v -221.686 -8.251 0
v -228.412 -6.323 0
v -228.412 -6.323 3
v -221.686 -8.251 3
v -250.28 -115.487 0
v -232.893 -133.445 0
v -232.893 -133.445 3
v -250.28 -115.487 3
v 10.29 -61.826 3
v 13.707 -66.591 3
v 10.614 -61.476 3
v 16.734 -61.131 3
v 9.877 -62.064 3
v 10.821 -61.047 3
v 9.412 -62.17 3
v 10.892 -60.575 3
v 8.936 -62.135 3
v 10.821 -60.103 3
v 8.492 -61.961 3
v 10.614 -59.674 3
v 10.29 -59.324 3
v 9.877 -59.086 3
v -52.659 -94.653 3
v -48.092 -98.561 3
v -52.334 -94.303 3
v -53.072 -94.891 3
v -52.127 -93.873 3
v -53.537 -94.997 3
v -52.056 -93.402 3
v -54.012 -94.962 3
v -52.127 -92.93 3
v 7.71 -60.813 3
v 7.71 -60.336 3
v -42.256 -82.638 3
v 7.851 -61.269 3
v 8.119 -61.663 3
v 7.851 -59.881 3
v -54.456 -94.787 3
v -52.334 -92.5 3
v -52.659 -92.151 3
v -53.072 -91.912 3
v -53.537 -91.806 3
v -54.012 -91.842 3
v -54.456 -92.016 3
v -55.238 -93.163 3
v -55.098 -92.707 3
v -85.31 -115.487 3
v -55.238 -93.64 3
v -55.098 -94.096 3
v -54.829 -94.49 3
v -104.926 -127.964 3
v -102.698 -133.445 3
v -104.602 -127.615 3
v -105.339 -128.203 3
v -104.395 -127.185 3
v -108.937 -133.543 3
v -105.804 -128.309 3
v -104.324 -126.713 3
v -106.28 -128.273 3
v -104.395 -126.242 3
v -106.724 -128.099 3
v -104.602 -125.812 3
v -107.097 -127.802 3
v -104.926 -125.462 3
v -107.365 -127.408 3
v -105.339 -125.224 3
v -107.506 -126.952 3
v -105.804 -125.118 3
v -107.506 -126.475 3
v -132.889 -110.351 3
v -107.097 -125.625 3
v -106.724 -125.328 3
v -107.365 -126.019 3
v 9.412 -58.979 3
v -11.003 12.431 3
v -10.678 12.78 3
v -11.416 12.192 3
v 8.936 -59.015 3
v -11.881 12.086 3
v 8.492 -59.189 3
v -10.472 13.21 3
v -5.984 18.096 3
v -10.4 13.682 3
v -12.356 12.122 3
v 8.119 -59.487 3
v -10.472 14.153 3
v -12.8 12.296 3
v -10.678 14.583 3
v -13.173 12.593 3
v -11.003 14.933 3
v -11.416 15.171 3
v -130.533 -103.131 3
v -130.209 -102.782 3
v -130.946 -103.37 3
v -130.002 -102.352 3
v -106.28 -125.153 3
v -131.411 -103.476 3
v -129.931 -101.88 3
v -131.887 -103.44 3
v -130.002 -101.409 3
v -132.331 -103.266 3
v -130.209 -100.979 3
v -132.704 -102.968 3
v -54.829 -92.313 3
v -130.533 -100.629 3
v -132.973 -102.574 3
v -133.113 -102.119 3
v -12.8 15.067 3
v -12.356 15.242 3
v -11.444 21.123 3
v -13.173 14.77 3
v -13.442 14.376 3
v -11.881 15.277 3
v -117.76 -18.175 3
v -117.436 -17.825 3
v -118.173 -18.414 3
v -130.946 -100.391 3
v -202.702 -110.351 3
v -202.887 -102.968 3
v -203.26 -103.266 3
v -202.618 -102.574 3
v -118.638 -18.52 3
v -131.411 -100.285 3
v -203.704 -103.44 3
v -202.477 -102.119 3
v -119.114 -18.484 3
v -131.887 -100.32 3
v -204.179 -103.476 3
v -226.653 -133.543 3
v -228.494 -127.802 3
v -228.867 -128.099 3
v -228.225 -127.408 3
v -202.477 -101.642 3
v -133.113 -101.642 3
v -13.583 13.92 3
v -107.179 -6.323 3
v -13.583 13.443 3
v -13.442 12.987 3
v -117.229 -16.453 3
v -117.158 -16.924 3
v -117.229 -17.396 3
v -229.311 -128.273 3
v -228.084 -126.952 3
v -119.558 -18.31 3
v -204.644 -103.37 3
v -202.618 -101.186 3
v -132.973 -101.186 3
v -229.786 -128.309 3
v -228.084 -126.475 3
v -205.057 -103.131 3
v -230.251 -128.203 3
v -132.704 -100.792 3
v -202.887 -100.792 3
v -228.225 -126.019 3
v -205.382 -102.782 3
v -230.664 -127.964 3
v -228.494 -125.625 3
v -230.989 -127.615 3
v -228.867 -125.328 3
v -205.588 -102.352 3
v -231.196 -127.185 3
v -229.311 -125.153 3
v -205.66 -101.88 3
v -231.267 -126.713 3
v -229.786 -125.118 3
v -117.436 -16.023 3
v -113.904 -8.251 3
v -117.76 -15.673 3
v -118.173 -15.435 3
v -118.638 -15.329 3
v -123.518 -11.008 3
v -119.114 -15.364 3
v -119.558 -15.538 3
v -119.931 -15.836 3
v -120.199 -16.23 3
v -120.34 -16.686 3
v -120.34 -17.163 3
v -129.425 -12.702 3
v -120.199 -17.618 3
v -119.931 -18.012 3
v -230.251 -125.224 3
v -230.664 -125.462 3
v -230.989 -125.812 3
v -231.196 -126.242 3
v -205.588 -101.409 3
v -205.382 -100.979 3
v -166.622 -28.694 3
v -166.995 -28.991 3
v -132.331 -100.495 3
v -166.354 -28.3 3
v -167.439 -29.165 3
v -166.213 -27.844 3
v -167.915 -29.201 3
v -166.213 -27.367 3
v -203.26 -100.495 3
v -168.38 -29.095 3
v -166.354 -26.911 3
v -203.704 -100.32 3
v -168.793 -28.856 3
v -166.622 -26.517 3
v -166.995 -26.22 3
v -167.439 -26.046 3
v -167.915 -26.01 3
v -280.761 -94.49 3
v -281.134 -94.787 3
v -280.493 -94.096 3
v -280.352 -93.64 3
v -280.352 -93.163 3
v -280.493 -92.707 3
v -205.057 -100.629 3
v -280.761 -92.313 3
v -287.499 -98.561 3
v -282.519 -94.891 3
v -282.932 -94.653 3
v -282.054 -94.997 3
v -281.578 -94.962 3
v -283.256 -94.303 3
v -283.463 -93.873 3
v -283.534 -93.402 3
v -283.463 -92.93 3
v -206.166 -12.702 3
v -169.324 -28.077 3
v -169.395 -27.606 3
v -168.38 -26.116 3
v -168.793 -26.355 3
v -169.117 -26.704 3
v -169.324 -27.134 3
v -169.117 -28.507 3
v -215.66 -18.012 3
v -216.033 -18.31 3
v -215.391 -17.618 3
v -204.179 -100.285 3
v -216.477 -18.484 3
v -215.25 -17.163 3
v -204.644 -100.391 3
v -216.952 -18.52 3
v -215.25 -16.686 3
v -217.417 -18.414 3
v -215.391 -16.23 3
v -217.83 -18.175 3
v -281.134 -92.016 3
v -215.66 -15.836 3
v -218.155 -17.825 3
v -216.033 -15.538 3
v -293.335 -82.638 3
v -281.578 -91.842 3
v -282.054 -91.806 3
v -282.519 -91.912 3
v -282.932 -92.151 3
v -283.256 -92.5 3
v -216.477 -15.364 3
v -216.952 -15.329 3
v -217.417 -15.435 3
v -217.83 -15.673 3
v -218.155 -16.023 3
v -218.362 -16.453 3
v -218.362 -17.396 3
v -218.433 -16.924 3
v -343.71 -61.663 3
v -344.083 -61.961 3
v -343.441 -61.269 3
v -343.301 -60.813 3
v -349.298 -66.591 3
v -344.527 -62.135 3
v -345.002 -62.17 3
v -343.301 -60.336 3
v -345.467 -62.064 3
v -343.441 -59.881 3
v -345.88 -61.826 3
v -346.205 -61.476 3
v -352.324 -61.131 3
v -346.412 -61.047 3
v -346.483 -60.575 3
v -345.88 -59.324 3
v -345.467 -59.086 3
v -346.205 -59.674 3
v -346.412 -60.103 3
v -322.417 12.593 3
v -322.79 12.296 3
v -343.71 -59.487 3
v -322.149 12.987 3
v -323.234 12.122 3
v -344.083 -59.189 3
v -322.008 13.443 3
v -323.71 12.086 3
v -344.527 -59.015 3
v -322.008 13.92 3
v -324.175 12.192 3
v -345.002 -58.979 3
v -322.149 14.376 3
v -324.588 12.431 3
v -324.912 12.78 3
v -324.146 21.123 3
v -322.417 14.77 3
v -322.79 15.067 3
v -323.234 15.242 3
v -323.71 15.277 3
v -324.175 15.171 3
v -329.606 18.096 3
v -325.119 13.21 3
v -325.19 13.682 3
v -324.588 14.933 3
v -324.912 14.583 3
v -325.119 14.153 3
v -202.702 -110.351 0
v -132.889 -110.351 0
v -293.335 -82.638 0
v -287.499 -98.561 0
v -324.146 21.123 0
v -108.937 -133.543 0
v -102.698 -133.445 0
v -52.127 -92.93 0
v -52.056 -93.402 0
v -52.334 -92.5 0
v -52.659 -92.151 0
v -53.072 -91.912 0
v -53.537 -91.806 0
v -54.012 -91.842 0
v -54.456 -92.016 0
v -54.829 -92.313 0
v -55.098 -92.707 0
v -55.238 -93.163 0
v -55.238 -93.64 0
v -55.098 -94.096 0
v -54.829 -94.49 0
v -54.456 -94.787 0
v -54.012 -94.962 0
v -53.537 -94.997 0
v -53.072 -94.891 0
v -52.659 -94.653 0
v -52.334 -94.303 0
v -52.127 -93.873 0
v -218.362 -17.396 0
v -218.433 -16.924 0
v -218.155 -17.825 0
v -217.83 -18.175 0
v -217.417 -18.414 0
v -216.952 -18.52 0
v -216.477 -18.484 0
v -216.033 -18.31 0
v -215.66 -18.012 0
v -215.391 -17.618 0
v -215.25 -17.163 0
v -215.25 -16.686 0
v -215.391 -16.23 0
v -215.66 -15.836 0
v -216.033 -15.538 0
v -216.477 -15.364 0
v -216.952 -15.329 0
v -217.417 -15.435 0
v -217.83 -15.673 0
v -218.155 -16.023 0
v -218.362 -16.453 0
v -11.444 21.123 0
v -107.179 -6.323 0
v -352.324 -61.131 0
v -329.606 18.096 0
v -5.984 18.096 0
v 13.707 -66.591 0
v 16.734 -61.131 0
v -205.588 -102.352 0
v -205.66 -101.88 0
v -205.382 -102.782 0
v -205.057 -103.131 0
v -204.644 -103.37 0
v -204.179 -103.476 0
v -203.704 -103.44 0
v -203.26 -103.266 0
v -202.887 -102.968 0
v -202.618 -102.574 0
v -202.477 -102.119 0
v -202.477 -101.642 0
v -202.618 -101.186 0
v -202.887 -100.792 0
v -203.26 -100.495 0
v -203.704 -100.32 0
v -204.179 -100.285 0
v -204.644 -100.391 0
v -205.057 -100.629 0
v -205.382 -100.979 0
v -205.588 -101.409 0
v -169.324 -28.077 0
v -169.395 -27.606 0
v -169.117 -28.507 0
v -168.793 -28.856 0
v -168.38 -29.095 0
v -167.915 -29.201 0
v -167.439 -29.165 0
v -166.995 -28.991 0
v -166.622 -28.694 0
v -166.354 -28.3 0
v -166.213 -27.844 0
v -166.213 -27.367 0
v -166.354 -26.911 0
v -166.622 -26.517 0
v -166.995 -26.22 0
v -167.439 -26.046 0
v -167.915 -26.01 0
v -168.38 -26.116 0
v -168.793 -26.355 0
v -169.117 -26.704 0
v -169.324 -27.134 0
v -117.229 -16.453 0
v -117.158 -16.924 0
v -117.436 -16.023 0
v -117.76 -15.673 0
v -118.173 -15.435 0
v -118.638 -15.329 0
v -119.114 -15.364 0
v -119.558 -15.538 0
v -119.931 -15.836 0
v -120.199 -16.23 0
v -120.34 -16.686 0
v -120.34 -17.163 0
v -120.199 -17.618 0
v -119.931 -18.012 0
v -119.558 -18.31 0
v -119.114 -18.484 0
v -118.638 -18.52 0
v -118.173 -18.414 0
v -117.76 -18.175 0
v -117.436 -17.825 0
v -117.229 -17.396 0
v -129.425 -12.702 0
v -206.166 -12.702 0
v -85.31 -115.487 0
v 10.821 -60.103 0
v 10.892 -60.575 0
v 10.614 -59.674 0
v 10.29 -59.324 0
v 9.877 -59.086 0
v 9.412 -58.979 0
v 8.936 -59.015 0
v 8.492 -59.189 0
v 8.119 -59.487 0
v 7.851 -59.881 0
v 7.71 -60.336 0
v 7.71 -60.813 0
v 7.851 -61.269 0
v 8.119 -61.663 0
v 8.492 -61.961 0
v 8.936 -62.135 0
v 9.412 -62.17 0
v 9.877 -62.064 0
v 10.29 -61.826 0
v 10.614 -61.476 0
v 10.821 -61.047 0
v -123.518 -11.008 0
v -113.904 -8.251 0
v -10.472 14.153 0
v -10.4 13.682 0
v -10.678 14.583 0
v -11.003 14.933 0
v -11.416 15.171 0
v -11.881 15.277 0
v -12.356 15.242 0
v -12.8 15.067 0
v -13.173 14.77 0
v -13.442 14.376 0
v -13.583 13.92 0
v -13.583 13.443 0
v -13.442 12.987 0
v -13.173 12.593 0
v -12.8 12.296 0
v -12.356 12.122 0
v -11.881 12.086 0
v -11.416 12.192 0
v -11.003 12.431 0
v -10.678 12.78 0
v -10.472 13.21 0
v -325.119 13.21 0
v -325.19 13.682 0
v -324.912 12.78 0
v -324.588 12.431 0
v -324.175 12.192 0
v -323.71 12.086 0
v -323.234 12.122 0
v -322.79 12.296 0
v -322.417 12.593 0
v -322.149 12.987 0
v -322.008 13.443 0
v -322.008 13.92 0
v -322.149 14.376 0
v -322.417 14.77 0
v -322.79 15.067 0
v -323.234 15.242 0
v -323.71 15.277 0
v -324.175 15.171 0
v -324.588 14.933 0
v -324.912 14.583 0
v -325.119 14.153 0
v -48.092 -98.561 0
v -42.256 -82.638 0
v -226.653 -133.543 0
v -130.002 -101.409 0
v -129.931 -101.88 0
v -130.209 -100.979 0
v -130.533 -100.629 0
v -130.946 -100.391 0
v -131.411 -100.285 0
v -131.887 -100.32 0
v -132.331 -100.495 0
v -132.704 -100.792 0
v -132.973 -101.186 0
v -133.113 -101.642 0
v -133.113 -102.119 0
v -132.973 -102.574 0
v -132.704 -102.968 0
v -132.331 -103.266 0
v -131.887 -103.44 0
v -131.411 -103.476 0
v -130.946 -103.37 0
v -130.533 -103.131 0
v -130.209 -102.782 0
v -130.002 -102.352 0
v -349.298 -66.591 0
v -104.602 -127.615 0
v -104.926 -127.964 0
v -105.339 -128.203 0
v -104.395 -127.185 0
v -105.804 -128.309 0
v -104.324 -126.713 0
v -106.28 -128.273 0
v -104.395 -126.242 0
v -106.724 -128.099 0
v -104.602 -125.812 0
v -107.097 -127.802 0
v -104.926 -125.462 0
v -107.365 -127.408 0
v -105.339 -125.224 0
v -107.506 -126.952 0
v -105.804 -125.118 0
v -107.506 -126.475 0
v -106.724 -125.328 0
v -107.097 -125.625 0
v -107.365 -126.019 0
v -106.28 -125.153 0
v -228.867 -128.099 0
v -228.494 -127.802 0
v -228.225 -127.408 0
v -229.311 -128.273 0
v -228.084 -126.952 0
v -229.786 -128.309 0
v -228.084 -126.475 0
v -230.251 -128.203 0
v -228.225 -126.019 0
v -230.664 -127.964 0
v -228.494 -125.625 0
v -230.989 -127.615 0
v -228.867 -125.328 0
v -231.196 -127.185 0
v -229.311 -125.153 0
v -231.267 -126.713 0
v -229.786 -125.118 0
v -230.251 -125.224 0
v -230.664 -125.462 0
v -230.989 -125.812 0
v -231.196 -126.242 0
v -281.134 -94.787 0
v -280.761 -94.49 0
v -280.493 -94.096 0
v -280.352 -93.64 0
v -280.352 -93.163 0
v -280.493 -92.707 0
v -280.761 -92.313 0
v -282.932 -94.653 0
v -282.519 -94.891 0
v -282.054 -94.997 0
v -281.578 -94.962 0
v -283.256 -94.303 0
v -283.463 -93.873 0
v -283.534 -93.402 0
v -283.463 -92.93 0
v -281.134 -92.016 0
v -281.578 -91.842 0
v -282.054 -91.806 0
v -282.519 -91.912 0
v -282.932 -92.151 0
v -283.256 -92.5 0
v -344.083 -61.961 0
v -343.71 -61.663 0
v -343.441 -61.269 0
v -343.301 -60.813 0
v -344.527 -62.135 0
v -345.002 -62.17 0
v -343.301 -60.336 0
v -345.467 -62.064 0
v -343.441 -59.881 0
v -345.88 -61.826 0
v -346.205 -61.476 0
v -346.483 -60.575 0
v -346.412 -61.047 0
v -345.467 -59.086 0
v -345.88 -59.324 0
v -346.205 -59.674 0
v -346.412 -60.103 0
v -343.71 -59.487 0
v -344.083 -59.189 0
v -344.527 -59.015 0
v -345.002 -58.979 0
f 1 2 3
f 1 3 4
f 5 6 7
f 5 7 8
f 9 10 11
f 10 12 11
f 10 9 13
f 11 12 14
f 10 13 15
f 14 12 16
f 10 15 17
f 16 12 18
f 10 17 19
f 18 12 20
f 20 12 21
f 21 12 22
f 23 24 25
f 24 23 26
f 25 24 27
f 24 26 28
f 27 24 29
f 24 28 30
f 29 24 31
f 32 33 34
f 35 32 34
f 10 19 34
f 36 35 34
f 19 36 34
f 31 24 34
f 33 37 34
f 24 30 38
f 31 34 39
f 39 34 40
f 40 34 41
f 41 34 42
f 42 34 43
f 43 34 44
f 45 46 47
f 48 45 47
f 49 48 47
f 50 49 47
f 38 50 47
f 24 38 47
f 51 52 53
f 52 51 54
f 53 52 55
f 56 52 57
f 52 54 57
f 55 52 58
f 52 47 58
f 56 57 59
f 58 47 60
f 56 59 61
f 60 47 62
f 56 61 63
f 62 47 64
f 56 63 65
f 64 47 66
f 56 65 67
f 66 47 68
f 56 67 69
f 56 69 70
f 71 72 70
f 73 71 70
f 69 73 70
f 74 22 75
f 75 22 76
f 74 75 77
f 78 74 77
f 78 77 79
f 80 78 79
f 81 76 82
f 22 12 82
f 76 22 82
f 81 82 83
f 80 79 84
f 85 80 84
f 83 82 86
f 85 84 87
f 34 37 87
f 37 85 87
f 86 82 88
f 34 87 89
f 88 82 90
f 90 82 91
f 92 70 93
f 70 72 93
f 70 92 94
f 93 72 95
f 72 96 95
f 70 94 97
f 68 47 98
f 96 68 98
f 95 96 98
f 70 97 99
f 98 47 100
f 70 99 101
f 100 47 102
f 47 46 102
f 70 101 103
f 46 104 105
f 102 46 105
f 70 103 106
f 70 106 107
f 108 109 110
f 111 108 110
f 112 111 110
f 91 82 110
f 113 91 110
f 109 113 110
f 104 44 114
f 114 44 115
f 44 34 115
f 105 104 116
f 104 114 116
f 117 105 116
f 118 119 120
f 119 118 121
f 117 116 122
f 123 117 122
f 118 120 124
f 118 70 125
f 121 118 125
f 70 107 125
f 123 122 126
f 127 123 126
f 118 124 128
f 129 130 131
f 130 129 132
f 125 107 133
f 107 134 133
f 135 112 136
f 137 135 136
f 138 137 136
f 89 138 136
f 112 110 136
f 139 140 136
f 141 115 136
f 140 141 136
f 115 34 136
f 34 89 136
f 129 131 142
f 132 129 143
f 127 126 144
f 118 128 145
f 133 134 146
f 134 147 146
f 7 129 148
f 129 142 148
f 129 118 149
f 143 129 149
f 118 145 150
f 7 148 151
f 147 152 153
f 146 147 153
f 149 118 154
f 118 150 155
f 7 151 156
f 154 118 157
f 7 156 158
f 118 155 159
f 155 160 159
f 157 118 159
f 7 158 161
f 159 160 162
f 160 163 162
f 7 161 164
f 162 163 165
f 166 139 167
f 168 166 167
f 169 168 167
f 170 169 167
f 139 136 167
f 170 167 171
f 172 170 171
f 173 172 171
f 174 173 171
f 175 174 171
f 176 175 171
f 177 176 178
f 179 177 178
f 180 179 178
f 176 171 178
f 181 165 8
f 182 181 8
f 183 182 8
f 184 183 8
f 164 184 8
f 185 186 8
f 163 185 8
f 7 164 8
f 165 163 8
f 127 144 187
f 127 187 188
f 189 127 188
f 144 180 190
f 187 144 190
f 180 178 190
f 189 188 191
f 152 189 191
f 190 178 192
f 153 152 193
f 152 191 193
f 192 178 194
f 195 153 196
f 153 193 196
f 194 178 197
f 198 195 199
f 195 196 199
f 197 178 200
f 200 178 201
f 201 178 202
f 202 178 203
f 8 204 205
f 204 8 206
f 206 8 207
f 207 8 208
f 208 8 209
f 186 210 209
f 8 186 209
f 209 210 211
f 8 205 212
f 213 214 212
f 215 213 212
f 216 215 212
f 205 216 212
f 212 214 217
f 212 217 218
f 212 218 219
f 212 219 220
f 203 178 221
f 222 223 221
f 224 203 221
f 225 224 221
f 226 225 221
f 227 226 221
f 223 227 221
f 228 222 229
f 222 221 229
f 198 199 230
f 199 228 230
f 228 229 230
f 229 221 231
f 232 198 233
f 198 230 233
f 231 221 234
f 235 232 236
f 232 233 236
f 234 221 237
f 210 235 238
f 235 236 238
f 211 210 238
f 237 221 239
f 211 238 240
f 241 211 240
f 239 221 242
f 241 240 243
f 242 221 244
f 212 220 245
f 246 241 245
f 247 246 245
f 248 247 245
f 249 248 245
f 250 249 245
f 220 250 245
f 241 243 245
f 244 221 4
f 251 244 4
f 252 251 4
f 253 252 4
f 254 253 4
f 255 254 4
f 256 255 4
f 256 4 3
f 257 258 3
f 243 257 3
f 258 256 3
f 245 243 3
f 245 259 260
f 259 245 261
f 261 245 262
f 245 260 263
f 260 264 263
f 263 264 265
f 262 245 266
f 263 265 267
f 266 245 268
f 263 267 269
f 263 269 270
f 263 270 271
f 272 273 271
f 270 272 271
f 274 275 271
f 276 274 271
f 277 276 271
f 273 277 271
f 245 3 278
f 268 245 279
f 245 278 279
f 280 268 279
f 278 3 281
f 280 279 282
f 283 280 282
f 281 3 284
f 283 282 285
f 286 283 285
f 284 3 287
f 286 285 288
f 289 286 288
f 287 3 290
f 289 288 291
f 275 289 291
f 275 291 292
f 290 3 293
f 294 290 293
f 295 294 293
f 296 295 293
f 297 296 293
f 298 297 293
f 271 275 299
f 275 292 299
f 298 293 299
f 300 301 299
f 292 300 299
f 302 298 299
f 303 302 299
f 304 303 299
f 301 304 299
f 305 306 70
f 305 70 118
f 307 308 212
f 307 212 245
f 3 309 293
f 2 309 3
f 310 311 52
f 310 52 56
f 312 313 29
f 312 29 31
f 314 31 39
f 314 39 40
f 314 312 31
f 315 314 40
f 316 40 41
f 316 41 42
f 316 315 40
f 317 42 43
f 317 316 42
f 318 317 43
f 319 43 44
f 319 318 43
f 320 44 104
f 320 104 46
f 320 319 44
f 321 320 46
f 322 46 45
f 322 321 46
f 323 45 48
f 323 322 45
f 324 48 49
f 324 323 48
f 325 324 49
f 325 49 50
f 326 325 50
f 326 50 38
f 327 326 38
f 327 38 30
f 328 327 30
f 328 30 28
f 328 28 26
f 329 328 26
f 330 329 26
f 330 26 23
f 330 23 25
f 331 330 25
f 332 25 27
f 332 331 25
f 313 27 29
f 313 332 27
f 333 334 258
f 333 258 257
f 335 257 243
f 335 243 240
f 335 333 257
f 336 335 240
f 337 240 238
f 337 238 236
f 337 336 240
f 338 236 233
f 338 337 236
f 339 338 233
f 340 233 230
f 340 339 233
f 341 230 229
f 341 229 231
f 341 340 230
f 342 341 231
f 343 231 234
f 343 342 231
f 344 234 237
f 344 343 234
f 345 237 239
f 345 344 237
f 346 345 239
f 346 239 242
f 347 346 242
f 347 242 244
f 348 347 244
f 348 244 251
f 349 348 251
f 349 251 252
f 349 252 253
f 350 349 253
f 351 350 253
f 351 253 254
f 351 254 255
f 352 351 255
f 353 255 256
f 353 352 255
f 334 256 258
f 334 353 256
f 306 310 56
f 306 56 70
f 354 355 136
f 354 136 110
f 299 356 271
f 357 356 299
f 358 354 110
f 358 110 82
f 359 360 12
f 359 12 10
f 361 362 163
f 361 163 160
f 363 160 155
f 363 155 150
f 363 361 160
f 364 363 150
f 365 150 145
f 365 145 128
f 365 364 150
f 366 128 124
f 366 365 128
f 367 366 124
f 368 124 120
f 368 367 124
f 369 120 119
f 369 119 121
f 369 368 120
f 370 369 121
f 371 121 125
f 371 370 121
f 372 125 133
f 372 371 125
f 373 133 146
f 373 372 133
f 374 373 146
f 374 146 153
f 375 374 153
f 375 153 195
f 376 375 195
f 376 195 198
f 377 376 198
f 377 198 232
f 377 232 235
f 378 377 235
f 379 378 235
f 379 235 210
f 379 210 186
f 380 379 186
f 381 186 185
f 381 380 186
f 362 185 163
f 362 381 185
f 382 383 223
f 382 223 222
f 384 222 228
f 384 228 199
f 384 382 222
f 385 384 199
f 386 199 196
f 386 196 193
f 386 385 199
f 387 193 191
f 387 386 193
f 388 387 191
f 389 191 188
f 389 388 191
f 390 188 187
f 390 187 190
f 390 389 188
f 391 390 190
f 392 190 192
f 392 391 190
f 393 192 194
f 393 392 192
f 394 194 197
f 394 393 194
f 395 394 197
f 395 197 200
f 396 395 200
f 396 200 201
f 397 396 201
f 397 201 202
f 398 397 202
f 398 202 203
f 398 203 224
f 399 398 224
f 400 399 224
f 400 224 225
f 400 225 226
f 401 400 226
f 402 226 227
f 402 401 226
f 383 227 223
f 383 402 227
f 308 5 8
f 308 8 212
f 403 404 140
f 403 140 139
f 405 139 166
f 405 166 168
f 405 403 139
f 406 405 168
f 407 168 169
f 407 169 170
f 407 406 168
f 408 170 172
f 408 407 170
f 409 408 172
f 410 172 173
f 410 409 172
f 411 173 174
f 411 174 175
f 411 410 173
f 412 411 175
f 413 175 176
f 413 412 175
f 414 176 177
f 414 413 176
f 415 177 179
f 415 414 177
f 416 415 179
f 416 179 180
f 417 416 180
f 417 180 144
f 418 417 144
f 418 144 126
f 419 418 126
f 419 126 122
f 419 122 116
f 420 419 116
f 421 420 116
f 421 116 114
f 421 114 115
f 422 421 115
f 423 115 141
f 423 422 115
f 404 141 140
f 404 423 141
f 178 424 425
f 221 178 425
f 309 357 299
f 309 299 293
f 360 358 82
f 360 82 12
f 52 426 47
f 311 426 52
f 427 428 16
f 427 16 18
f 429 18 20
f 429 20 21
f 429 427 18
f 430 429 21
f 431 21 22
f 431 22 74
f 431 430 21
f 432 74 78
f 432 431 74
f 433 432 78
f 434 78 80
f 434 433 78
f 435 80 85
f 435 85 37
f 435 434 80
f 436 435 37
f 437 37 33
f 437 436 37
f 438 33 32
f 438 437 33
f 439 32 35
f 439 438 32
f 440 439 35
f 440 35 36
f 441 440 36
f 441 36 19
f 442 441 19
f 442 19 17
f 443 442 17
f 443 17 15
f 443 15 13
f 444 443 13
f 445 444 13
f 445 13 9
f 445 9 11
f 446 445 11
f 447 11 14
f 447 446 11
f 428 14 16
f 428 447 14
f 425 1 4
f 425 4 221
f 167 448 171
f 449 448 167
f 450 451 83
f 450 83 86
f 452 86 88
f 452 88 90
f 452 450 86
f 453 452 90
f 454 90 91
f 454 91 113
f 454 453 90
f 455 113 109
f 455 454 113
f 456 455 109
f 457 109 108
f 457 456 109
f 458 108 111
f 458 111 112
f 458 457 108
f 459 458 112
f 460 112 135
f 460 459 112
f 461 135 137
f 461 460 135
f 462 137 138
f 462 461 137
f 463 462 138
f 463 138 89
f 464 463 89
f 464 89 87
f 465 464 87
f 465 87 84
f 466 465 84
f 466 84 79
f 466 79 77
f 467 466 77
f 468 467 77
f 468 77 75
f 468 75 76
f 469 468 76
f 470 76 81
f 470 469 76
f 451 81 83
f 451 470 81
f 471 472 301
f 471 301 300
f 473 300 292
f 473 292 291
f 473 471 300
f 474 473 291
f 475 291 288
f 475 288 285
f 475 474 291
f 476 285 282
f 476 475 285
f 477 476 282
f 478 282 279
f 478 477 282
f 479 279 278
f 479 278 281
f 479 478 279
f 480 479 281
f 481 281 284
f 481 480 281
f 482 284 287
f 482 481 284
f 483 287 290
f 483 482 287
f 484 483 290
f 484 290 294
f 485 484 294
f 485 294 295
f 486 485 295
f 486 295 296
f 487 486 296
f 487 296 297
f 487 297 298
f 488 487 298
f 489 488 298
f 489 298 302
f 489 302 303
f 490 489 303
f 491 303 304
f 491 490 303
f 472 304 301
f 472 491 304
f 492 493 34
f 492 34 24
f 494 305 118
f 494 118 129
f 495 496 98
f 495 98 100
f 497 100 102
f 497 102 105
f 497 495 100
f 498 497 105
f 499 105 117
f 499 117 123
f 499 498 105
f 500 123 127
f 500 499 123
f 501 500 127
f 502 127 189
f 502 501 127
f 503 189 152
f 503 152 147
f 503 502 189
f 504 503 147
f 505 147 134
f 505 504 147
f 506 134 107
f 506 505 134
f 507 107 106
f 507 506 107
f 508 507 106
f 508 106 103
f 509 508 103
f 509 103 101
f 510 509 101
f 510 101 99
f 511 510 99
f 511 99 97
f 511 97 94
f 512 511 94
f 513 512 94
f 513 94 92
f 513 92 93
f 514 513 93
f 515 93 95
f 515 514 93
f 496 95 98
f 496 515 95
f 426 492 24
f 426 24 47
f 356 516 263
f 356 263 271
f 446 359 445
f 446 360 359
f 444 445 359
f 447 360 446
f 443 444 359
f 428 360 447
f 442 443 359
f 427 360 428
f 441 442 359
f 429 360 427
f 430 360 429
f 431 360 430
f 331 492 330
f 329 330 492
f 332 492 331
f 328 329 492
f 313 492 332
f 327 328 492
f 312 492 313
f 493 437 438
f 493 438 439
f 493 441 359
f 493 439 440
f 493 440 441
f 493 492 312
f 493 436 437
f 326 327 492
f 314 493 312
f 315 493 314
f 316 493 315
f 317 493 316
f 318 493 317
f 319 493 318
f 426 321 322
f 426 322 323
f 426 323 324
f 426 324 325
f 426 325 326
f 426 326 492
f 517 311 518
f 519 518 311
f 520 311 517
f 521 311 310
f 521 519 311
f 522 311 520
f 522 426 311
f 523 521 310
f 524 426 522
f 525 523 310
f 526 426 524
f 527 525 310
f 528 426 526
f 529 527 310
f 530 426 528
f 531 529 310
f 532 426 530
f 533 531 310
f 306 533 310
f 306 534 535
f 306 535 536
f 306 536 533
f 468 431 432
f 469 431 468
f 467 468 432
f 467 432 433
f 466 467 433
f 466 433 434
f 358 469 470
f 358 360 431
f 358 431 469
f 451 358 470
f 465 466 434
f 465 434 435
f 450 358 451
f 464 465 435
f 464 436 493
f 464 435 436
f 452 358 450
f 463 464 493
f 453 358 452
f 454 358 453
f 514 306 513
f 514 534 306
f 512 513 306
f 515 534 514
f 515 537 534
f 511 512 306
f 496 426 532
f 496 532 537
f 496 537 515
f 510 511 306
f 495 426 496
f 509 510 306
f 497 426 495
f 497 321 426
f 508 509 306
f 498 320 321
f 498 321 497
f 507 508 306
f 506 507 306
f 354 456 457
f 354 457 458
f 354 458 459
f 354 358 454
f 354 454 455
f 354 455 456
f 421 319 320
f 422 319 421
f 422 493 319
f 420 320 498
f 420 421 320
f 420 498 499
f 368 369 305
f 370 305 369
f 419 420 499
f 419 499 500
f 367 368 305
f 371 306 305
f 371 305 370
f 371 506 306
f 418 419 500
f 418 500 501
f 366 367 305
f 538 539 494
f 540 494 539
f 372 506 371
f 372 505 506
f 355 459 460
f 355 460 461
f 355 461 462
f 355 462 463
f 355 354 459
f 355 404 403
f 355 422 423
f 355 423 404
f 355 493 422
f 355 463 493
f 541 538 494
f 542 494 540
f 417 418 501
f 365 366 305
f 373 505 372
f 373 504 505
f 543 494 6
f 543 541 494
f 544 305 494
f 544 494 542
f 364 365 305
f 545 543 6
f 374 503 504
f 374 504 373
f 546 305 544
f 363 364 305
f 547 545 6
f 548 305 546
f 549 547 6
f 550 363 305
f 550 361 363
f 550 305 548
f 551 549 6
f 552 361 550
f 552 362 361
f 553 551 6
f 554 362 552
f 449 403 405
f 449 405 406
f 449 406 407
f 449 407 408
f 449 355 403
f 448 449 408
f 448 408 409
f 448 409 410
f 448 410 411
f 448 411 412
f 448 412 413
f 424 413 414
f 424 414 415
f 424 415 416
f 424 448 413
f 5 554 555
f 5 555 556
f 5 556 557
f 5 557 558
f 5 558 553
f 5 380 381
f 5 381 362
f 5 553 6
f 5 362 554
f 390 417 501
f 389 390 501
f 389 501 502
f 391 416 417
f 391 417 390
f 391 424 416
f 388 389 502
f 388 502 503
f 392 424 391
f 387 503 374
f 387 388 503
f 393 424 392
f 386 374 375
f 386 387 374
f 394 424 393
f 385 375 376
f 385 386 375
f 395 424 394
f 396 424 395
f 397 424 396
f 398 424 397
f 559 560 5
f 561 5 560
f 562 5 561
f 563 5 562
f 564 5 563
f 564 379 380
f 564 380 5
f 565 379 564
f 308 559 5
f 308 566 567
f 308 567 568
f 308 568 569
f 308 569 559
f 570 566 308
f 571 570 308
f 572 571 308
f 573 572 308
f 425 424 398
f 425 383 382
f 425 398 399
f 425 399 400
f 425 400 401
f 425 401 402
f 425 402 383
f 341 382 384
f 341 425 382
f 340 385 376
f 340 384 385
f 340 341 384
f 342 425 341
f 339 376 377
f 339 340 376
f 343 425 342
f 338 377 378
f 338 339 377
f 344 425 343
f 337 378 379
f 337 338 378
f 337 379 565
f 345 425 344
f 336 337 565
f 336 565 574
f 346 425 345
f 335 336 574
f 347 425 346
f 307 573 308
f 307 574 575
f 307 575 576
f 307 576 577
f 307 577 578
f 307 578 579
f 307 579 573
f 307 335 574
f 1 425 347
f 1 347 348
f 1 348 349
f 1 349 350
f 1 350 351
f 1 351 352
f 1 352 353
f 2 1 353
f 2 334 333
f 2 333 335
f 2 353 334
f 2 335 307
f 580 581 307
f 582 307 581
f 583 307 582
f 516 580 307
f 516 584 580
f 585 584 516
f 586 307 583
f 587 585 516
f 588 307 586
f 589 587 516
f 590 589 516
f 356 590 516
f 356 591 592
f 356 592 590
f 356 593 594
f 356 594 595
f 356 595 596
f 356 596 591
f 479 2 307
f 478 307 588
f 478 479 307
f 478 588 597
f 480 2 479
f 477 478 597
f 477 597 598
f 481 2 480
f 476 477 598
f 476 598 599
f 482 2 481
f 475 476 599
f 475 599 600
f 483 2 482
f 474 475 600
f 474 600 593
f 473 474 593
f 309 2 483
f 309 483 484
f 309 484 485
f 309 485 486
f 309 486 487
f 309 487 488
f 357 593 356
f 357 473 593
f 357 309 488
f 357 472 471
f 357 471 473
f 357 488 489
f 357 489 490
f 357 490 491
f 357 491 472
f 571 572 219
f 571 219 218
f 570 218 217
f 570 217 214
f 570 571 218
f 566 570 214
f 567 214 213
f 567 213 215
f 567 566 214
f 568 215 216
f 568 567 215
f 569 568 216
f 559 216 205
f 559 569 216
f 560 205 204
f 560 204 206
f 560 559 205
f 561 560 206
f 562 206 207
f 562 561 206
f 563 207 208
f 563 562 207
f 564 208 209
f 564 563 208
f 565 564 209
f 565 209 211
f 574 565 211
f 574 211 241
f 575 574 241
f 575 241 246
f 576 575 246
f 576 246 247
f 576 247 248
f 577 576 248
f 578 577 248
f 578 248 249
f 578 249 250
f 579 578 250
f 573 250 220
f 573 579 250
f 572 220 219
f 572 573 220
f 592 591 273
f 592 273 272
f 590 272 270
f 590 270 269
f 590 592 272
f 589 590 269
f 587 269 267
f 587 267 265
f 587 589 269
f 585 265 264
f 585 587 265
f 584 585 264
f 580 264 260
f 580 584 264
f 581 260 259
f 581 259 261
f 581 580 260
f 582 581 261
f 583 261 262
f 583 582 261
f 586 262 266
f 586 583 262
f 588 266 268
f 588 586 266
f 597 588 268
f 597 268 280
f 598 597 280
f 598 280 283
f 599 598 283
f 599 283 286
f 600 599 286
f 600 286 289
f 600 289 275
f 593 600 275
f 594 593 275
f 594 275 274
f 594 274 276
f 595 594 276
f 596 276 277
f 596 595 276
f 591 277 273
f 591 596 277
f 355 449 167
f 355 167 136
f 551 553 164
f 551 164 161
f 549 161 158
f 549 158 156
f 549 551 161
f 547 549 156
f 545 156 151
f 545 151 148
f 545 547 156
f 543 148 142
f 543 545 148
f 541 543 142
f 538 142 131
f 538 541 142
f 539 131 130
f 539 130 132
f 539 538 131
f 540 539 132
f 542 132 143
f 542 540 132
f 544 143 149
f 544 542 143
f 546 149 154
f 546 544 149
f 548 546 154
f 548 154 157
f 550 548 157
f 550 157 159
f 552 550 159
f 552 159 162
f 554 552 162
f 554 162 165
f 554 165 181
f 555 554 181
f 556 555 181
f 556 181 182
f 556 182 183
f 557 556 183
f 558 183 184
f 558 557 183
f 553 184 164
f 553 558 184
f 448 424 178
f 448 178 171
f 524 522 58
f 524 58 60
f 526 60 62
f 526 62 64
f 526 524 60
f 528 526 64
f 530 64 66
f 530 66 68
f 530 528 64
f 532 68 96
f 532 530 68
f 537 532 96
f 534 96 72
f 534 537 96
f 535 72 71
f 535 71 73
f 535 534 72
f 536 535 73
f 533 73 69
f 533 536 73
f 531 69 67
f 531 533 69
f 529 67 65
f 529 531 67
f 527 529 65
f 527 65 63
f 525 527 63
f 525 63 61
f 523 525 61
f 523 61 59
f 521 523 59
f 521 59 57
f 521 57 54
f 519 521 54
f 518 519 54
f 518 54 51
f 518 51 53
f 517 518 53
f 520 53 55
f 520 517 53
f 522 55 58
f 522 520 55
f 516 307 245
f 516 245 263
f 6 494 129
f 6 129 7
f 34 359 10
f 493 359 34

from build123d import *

# Parameters (mm, degrees)
ESQUISSE1_R        = 1.6
BOSS_EXTRU_1_DEPTH = 3


with BuildPart() as part:
    # Esquisse1 → Boss.-Extru.1 (new body)
    with BuildSketch(Plane.XY):
        Polygon((-324.146226634, 21.123080509), (-228.411595335, -6.322621021), (-221.686141291, -8.251113935), (-206.165691337, -12.701531345), (-167.175777529, -12.701531345), (-129.424828406, -12.701531345), (-123.517939729, -11.007758272), (-113.904378452, -8.251113935), (-107.178924408, -6.322621021), (-11.444293109, 21.123080509), (-5.984240232, 18.096325283), (16.733855492, -61.131089881), (13.707363231, -66.591026451), (-42.255771499, -82.638197107), (-48.091810819, -98.561018129), (-85.310364869, -115.48724507), (-102.69792658, -133.444615579), (-108.937044092, -133.542771169), (-132.888887149, -110.350948678), (-202.701632594, -110.350948678), (-226.653475651, -133.542771169), (-232.892593163, -133.444615579), (-250.280154874, -115.48724507), (-287.498708924, -98.561018129), (-293.334748244, -82.638197107), (-349.297882974, -66.591026451), (-352.324375235, -61.131089881), (-329.606279511, 18.096325283), align=None)
        with Locations((-12.000450916, 13.68165837)):
            Circle(ESQUISSE1_R, mode=Mode.SUBTRACT)
        with Locations((-118.757933777, -16.924131519)):
            Circle(ESQUISSE1_R, mode=Mode.SUBTRACT)
        with Locations((9.292284284, -60.574933915)):
            Circle(ESQUISSE1_R, mode=Mode.SUBTRACT)
        with Locations((-53.656180266, -93.401689518)):
            Circle(ESQUISSE1_R, mode=Mode.SUBTRACT)
        with Locations((-105.923928137, -126.713325795)):
            Circle(ESQUISSE1_R, mode=Mode.SUBTRACT)
        with Locations((-131.530967037, -101.880200807)):
            Circle(ESQUISSE1_R, mode=Mode.SUBTRACT)
        with Locations(Location((-204.059552706, -101.880200807, 0), (0, 0, 180))):
            Circle(ESQUISSE1_R, mode=Mode.SUBTRACT)
        with Locations(Location((-229.666591606, -126.713325795, 0), (0, 0, 180))):
            Circle(ESQUISSE1_R, mode=Mode.SUBTRACT)
        with Locations(Location((-281.934339477, -93.401689518, 0), (0, 0, 180))):
            Circle(ESQUISSE1_R, mode=Mode.SUBTRACT)
        with Locations(Location((-344.882804027, -60.574933915, 0), (0, 0, 180))):
            Circle(ESQUISSE1_R, mode=Mode.SUBTRACT)
        with Locations(Location((-216.832585966, -16.924131519, 0), (0, 0, 180))):
            Circle(ESQUISSE1_R, mode=Mode.SUBTRACT)
        with Locations(Location((-323.590068827, 13.68165837, 0), (0, 0, 180))):
            Circle(ESQUISSE1_R, mode=Mode.SUBTRACT)
        with Locations(Location((-167.795259872, -27.605548894, 0), (0, 0, 180))):
            Circle(ESQUISSE1_R, mode=Mode.SUBTRACT)
    extrude(amount=BOSS_EXTRU_1_DEPTH)


solid = part.part
